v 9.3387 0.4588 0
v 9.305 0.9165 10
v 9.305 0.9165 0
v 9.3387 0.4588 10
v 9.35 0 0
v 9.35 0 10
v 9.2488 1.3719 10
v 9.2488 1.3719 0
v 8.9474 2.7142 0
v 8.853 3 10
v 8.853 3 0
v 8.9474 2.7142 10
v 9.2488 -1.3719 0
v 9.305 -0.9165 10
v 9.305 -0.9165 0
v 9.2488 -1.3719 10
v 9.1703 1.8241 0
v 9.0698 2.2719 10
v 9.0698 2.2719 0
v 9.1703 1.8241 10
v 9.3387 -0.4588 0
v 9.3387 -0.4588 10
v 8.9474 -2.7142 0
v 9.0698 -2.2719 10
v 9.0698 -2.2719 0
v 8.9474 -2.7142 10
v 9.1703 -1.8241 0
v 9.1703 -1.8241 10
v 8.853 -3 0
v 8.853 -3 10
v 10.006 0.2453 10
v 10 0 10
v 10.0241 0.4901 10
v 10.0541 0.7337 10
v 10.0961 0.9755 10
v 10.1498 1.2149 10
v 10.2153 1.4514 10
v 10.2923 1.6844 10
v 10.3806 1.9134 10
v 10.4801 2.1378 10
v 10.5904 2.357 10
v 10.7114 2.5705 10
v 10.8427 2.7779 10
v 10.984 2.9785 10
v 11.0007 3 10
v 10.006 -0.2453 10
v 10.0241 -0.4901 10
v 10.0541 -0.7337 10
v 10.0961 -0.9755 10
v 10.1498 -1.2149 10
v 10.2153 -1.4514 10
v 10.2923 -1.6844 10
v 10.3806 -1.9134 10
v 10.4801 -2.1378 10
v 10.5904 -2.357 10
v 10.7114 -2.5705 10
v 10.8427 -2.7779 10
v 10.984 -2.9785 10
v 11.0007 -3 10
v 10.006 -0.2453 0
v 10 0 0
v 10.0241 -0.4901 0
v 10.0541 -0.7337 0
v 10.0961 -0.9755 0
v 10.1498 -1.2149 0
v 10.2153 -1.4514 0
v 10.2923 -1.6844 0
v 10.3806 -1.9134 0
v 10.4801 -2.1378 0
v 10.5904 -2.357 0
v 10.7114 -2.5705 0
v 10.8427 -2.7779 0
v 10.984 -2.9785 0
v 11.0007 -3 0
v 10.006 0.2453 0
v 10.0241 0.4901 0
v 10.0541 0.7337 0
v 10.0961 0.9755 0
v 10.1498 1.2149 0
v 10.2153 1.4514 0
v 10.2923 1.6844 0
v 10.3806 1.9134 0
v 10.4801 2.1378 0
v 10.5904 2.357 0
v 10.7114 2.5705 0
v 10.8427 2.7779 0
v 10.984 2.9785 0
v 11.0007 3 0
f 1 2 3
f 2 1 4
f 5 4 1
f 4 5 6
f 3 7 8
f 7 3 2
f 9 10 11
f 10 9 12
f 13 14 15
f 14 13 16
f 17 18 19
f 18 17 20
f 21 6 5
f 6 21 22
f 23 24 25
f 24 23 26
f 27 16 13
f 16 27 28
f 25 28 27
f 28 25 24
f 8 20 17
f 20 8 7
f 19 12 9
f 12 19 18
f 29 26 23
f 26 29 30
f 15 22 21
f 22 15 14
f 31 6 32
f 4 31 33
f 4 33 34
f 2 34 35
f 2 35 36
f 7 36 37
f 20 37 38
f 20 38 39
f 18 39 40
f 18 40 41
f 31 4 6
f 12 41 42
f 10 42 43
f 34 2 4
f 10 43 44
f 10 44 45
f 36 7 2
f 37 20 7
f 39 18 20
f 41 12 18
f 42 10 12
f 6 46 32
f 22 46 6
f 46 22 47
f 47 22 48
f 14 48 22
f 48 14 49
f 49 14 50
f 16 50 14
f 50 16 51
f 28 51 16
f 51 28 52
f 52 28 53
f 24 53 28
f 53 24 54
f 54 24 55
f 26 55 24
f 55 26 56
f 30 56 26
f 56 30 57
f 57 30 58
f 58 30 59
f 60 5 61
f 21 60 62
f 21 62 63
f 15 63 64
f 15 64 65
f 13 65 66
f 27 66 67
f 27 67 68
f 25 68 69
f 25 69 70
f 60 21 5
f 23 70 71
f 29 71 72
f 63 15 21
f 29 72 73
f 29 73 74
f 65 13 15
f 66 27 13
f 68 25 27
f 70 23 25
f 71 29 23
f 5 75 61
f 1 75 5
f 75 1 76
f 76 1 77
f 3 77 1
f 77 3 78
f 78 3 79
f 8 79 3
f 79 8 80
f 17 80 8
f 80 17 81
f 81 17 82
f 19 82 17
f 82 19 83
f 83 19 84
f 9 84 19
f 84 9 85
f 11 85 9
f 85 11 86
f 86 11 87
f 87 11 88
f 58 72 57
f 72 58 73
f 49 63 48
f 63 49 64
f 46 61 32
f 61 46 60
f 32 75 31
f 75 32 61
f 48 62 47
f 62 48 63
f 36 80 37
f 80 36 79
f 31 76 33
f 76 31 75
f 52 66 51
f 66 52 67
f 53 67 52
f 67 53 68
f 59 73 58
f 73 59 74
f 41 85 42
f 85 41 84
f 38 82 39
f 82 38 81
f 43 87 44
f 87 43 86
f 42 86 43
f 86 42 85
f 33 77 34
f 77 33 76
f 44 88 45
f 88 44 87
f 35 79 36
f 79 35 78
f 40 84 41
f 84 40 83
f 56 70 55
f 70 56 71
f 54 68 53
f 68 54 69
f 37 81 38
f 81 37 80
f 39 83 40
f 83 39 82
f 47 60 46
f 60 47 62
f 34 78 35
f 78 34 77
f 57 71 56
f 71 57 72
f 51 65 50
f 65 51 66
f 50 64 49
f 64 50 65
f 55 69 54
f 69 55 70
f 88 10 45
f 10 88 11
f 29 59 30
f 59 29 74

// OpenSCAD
// Snap-on Clip for Lab Stand Rod and Tubing
// Orientation: Flat on XY plane, building upward (+Z)
// Units: Millimetres

// --- Dimensions ---
// Rod Ring
$rod_inner_d = 12.7;   // Inner diameter for 1/2" rod
$rod_wall = 3;         // Wall thickness
$rod_outer_d = $rod_inner_d + 2 * $rod_wall; // 18.7 mm
$rod_height = 10;      // Extrusion height (Z)
$rod_cut_width = 10;   // Width of opening on -X side (x < 0)

// Tubing Ring
$tube_inner_d = 6;     // Inner diameter
$tube_wall = 2;        // Wall thickness
$tube_outer_d = $tube_inner_d + 2 * $tube_wall; // 10 mm
$tube_x_pos = 15;      // Center X position
$tube_cut_width = 4.5; // Width of opening on +X side (x > 15)

// Bridge
$bridge_x_start = 8;   // Start X
$bridge_x_end = 12;    // End X
$bridge_width_x = $bridge_x_end - $bridge_x_start; // 4 mm
$bridge_height_y = 6;  // Height in Y (-3 to +3)
$bridge_z = $rod_height;

// --- Configuration ---
$fn = 128;             // High resolution for smooth curves

// --- Main Construction ---
// Strategy: Create a solid block for the bridge, then subtract the two rings.
// This ensures the rings have their internal holes (for the rod/tube) and side cutouts,
// while the bridge connects them.

difference() {
    // 1. The Solid Bridge
    translate([$bridge_x_start, -$bridge_height_y/2, 0]) {
        cube([
            $bridge_width_x, 
            $bridge_height_y, 
            $bridge_z
        ]);
    }
    
    // 2. Subtract Rod Ring
    // The ring is defined as: Outer Cylinder - Inner Hole - Side Cutout
    translate([0, 0, 0]) {
        difference() {
            // Outer Shell
            cylinder(h = $bridge_z, d = $rod_outer_d, center = [0, 0, $bridge_z/2]);
            
            // Inner Hole (for rod)
            cylinder(h = $bridge_z, d = $rod_inner_d, center = [0, 0, $bridge_z/2]);
            
            // Side Cutout (x < 0, -5 < y < 5)
            // We subtract a block that covers this region.
            // X range: -infinity to 0. We use -20 to 0.
            // Y range: -5 to 5. We use -6 to 6.
            translate([-20, -6, 0]) {
                cube([20, 12, $bridge_z + 0.1]);
            }
        }
    }
    
    // 3. Subtract Tubing Ring
    // The ring is defined as: Outer Cylinder - Inner Hole - Side Cutout
    translate([$tube_x_pos, 0, 0]) {
        difference() {
            // Outer Shell
            cylinder(h = $bridge_z, d = $tube_outer_d, center = [0, 0, $bridge_z/2]);
            
            // Inner Hole (for tubing)
            cylinder(h = $bridge_z, d = $tube_inner_d, center = [0, 0, $bridge_z/2]);
            
            // Side Cutout (x > 15, -2.25 < y < 2.25)
            // In local coords (centered at 15): x > 0, -2.25 < y < 2.25.
            // We subtract a block covering x > 0.
            translate([0, -3, 0]) {
                cube([20, 6, $bridge_z + 0.1]);
            }
        }
    }
}
